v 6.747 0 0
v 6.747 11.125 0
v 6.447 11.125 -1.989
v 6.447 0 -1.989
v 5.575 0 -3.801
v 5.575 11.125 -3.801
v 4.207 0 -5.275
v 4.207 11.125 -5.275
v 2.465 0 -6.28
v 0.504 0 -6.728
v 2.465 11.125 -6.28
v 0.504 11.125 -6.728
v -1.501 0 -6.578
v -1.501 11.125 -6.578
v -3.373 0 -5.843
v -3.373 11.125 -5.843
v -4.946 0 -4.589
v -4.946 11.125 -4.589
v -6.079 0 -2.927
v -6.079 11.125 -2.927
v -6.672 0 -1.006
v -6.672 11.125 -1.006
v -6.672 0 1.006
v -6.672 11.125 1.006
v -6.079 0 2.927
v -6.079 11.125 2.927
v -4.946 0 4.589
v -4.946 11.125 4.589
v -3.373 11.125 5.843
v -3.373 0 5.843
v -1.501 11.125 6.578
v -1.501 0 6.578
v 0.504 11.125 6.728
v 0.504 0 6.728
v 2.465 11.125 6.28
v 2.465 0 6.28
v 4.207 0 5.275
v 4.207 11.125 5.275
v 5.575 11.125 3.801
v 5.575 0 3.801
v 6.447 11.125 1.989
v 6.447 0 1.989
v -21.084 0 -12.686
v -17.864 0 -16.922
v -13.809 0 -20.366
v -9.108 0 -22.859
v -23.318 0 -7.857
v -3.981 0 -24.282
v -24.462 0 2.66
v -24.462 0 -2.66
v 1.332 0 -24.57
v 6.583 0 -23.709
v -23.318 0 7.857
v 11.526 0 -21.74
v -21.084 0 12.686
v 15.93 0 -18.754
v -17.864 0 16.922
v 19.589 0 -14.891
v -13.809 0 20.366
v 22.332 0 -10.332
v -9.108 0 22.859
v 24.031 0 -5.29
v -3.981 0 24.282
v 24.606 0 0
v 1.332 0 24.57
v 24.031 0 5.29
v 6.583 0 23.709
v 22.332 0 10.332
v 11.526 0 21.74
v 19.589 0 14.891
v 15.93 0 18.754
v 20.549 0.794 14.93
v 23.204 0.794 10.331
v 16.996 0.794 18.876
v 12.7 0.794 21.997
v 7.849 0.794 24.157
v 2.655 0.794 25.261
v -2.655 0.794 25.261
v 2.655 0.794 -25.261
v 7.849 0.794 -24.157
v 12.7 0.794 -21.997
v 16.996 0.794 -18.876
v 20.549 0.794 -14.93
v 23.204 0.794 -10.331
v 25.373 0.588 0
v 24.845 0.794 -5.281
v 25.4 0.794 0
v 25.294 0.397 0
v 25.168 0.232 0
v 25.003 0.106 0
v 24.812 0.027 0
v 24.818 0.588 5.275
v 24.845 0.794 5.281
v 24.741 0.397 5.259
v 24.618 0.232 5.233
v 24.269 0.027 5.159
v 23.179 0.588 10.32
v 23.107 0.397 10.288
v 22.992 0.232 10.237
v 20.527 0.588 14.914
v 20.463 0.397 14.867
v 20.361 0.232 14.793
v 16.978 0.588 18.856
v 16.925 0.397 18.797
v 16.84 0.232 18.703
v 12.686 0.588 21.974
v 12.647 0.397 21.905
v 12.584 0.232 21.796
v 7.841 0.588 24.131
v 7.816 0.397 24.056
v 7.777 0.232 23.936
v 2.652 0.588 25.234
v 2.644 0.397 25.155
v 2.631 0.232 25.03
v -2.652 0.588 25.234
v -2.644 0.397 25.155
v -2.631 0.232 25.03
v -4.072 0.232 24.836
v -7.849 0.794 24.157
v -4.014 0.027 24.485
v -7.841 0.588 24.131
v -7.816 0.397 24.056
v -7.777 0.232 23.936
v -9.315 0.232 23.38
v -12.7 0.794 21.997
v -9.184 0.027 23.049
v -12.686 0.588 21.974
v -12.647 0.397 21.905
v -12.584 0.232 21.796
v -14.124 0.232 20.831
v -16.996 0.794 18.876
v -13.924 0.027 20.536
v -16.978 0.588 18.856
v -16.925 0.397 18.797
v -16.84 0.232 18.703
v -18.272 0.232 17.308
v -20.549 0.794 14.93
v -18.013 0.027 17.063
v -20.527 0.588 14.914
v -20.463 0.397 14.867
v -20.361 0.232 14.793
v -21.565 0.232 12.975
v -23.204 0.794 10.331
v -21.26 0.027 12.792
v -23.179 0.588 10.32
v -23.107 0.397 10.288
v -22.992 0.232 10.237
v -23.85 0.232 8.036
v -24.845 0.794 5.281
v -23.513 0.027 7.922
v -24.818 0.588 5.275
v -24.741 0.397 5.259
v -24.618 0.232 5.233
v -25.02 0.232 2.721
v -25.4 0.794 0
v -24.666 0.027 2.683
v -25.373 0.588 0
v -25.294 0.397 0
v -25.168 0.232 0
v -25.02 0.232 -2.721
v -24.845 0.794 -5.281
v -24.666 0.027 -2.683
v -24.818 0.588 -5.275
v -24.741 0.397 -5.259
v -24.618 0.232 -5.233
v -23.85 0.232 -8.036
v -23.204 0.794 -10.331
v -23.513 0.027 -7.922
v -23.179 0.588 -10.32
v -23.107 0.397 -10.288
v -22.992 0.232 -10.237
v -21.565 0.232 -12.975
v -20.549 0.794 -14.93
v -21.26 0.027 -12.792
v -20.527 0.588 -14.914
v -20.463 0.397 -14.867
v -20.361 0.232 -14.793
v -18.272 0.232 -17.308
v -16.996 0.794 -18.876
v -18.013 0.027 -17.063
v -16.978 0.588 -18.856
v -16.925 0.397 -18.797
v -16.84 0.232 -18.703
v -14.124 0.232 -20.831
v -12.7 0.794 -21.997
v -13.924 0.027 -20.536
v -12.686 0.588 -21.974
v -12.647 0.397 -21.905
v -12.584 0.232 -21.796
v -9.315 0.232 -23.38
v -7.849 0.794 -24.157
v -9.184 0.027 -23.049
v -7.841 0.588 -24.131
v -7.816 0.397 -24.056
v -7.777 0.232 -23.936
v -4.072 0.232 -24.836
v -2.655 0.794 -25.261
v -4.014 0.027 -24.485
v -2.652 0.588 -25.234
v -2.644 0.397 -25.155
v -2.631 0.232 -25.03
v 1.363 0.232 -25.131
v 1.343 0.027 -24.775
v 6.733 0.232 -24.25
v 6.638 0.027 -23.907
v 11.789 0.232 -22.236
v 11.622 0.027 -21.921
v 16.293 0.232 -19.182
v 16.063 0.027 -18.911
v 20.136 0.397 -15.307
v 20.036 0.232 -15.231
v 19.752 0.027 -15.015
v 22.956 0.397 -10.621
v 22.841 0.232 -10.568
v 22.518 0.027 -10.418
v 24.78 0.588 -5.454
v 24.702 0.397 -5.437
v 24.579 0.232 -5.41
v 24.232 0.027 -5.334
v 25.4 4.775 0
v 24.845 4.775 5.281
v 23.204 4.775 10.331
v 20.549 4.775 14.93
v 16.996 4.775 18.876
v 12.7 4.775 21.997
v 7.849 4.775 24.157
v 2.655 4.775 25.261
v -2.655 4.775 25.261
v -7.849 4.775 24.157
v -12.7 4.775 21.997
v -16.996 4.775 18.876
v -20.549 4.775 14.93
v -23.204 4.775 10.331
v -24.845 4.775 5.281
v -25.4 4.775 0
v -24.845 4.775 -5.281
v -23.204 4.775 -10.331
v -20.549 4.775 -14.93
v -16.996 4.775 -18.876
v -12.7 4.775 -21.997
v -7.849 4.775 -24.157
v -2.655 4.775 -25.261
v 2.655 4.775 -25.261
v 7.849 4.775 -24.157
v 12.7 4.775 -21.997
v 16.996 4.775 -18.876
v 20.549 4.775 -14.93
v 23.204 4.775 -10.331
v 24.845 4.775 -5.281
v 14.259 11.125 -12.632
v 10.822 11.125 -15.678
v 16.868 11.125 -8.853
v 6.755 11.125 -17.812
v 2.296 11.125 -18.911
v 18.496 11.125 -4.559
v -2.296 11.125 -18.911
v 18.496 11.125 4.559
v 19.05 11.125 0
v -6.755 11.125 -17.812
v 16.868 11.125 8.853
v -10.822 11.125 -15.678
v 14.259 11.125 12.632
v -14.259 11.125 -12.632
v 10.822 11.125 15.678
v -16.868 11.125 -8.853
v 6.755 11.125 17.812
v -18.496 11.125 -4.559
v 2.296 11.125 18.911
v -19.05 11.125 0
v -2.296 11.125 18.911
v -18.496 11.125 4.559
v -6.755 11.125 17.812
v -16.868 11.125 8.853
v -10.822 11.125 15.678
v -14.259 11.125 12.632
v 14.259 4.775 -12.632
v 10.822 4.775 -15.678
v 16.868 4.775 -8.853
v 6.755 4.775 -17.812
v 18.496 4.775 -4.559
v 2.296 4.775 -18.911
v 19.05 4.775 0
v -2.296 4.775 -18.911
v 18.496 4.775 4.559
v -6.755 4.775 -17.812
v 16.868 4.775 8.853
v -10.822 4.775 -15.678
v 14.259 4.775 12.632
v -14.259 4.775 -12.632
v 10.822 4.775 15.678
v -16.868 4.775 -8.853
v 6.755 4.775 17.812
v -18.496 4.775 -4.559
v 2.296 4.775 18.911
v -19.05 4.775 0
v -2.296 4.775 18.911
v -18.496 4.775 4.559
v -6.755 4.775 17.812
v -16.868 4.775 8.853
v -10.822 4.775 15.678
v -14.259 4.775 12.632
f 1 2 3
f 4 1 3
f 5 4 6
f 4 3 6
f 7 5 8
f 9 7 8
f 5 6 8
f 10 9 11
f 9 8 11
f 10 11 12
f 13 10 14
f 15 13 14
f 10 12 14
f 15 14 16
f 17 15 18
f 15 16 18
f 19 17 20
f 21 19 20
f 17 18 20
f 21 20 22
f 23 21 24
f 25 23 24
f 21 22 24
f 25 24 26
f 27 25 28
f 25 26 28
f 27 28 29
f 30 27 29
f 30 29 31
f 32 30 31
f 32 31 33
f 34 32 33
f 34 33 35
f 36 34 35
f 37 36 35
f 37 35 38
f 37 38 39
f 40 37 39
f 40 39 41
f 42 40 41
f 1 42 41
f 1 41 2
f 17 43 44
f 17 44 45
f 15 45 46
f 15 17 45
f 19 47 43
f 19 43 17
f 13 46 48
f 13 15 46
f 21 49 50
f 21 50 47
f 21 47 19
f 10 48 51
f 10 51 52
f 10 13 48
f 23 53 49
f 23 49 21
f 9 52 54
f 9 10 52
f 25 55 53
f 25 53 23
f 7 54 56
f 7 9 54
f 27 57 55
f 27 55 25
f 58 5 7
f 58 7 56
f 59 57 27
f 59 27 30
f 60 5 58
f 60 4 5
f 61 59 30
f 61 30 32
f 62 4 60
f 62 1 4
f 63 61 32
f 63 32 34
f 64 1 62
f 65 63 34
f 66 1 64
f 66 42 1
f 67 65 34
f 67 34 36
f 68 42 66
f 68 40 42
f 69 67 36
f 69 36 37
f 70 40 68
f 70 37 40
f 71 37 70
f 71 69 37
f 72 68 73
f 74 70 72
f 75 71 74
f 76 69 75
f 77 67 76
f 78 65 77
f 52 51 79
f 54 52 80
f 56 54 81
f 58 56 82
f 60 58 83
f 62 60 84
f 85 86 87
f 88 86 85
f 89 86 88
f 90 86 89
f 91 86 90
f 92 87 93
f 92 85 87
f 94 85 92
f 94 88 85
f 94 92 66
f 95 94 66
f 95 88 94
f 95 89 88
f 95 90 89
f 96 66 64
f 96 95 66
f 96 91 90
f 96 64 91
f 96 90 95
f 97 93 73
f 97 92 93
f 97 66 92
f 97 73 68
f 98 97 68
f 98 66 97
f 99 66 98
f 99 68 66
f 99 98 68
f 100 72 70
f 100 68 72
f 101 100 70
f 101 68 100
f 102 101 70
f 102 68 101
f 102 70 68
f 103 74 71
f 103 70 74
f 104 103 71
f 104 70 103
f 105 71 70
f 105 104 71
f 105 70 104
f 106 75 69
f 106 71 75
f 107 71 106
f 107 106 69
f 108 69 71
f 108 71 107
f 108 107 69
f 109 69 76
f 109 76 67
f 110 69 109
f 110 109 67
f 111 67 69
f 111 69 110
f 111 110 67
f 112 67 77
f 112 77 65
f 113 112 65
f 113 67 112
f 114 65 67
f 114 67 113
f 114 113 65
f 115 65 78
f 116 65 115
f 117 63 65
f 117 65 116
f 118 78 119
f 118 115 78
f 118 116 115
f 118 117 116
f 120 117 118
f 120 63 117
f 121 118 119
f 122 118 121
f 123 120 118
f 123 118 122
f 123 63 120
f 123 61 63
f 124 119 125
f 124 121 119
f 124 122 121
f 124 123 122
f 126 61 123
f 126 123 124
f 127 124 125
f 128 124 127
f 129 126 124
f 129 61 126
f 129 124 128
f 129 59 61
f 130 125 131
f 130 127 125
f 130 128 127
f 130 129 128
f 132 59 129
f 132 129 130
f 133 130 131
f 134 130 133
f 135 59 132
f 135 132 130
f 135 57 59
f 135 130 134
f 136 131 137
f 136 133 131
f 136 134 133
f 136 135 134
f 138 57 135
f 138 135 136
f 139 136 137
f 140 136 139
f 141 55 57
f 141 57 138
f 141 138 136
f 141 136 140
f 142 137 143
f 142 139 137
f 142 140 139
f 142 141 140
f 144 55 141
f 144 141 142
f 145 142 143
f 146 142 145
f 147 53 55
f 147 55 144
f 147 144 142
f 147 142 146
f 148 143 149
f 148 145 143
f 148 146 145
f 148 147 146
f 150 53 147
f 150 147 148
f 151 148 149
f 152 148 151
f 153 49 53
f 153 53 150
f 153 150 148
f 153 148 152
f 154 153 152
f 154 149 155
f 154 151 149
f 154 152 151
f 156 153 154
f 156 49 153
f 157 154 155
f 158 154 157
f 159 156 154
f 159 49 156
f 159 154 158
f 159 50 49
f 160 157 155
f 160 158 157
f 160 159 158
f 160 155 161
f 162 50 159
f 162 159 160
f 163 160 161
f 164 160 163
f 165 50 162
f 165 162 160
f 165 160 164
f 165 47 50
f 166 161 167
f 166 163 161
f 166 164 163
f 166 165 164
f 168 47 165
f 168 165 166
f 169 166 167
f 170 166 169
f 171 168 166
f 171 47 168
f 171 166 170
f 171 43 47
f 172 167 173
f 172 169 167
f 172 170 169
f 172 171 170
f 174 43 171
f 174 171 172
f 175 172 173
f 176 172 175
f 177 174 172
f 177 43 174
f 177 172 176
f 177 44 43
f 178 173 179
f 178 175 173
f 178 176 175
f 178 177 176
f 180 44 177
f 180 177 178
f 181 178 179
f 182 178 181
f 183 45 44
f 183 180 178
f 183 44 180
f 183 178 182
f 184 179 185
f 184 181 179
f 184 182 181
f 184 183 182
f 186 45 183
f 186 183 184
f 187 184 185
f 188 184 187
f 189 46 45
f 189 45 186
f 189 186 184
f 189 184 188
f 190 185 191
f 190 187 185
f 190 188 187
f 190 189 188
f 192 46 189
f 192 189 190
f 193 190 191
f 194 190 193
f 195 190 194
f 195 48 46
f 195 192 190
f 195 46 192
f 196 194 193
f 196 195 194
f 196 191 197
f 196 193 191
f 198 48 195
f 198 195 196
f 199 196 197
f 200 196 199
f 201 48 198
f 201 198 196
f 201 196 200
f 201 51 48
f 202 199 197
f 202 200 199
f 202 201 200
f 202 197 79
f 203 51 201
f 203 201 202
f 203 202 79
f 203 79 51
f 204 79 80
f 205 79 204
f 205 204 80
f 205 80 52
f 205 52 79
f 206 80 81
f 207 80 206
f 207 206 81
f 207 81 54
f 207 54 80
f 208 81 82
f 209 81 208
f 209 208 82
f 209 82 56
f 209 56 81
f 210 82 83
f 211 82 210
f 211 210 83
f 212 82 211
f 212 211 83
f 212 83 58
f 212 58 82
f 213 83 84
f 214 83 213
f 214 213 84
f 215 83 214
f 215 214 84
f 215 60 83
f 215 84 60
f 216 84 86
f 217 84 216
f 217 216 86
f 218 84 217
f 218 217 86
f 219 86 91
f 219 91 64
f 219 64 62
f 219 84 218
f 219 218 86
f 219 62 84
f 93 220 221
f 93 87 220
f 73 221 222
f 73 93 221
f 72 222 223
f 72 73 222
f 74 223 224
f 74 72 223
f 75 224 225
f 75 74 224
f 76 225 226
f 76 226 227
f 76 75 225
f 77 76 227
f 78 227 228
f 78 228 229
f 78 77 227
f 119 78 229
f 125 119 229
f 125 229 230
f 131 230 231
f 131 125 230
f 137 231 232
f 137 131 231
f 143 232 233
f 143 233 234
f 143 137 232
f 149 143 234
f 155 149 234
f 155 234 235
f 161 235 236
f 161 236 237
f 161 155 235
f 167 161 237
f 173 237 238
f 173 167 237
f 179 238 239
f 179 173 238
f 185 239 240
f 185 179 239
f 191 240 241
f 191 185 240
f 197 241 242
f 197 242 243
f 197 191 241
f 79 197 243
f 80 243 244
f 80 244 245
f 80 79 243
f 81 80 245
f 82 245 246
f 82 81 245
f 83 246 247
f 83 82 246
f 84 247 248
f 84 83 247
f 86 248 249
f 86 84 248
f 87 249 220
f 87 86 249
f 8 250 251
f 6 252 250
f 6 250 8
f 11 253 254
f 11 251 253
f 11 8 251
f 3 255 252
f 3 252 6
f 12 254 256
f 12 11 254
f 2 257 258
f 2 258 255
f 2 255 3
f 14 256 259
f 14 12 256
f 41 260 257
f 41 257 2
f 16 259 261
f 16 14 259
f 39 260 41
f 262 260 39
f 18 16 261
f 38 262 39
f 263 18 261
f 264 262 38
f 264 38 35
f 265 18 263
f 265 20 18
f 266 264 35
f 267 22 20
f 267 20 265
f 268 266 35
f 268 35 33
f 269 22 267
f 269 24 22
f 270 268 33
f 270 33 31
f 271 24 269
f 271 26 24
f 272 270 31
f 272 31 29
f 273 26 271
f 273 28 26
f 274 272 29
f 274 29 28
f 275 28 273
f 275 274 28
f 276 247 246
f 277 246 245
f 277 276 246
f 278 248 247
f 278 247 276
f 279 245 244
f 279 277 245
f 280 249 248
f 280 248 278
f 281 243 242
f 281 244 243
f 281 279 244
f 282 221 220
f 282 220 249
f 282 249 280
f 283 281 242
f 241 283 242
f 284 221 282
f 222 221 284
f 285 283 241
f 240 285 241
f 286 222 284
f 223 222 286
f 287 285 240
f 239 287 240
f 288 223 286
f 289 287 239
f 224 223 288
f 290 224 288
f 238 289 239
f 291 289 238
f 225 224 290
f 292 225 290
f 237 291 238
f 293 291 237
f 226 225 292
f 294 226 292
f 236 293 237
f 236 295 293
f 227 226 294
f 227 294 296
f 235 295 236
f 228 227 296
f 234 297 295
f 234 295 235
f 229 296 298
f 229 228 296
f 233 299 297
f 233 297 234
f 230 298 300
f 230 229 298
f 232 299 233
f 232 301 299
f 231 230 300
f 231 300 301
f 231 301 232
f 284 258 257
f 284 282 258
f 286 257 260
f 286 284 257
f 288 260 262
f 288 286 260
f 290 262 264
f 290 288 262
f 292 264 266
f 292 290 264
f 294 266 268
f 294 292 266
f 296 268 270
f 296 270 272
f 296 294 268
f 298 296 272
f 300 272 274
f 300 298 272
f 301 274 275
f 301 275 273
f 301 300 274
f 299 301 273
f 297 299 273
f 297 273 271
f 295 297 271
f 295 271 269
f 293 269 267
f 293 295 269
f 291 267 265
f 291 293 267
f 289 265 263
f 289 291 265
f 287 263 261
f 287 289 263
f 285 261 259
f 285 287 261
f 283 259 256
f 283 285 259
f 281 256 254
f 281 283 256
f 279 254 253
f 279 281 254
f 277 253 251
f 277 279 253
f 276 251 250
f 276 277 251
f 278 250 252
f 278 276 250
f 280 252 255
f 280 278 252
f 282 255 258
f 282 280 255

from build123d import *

# Parameters (mm, degrees)
SKETCH2_R          = 6.746875
CUT_EXTRUDE1_DEPTH = 12.1252


with BuildPart() as part:
    # Sketch1 → Revolve1 (revolve)
    with BuildSketch(Plane.XY):
        with BuildLine():
            Line((0, 0), (0, 11.1252))
            Line((0, 11.1252), (19.05, 11.1252))
            Line((19.05, 11.1252), (19.05, 4.7752))
            Line((19.05, 4.7752), (25.4, 4.7752))
            Line((25.4, 4.7752), (25.4, 0.79375))
            ThreePointArc((25.4, 0.79375), (25.167516008, 0.232483992), (24.60625, 0))
            Line((24.60625, 0), (0, 0))
        make_face()
    revolve(axis=Axis((0, 140.214345547, 0), (0, -1, 0)))

    # Sketch2 → Cut-Extrude1 (cut, through all)
    with BuildSketch(Plane(origin=(0, 11.1252, 0), x_dir=(1, 0, 0), z_dir=(0, 1, 0))):
        Circle(SKETCH2_R)
    extrude(amount=-CUT_EXTRUDE1_DEPTH, mode=Mode.SUBTRACT)


solid = part.part
